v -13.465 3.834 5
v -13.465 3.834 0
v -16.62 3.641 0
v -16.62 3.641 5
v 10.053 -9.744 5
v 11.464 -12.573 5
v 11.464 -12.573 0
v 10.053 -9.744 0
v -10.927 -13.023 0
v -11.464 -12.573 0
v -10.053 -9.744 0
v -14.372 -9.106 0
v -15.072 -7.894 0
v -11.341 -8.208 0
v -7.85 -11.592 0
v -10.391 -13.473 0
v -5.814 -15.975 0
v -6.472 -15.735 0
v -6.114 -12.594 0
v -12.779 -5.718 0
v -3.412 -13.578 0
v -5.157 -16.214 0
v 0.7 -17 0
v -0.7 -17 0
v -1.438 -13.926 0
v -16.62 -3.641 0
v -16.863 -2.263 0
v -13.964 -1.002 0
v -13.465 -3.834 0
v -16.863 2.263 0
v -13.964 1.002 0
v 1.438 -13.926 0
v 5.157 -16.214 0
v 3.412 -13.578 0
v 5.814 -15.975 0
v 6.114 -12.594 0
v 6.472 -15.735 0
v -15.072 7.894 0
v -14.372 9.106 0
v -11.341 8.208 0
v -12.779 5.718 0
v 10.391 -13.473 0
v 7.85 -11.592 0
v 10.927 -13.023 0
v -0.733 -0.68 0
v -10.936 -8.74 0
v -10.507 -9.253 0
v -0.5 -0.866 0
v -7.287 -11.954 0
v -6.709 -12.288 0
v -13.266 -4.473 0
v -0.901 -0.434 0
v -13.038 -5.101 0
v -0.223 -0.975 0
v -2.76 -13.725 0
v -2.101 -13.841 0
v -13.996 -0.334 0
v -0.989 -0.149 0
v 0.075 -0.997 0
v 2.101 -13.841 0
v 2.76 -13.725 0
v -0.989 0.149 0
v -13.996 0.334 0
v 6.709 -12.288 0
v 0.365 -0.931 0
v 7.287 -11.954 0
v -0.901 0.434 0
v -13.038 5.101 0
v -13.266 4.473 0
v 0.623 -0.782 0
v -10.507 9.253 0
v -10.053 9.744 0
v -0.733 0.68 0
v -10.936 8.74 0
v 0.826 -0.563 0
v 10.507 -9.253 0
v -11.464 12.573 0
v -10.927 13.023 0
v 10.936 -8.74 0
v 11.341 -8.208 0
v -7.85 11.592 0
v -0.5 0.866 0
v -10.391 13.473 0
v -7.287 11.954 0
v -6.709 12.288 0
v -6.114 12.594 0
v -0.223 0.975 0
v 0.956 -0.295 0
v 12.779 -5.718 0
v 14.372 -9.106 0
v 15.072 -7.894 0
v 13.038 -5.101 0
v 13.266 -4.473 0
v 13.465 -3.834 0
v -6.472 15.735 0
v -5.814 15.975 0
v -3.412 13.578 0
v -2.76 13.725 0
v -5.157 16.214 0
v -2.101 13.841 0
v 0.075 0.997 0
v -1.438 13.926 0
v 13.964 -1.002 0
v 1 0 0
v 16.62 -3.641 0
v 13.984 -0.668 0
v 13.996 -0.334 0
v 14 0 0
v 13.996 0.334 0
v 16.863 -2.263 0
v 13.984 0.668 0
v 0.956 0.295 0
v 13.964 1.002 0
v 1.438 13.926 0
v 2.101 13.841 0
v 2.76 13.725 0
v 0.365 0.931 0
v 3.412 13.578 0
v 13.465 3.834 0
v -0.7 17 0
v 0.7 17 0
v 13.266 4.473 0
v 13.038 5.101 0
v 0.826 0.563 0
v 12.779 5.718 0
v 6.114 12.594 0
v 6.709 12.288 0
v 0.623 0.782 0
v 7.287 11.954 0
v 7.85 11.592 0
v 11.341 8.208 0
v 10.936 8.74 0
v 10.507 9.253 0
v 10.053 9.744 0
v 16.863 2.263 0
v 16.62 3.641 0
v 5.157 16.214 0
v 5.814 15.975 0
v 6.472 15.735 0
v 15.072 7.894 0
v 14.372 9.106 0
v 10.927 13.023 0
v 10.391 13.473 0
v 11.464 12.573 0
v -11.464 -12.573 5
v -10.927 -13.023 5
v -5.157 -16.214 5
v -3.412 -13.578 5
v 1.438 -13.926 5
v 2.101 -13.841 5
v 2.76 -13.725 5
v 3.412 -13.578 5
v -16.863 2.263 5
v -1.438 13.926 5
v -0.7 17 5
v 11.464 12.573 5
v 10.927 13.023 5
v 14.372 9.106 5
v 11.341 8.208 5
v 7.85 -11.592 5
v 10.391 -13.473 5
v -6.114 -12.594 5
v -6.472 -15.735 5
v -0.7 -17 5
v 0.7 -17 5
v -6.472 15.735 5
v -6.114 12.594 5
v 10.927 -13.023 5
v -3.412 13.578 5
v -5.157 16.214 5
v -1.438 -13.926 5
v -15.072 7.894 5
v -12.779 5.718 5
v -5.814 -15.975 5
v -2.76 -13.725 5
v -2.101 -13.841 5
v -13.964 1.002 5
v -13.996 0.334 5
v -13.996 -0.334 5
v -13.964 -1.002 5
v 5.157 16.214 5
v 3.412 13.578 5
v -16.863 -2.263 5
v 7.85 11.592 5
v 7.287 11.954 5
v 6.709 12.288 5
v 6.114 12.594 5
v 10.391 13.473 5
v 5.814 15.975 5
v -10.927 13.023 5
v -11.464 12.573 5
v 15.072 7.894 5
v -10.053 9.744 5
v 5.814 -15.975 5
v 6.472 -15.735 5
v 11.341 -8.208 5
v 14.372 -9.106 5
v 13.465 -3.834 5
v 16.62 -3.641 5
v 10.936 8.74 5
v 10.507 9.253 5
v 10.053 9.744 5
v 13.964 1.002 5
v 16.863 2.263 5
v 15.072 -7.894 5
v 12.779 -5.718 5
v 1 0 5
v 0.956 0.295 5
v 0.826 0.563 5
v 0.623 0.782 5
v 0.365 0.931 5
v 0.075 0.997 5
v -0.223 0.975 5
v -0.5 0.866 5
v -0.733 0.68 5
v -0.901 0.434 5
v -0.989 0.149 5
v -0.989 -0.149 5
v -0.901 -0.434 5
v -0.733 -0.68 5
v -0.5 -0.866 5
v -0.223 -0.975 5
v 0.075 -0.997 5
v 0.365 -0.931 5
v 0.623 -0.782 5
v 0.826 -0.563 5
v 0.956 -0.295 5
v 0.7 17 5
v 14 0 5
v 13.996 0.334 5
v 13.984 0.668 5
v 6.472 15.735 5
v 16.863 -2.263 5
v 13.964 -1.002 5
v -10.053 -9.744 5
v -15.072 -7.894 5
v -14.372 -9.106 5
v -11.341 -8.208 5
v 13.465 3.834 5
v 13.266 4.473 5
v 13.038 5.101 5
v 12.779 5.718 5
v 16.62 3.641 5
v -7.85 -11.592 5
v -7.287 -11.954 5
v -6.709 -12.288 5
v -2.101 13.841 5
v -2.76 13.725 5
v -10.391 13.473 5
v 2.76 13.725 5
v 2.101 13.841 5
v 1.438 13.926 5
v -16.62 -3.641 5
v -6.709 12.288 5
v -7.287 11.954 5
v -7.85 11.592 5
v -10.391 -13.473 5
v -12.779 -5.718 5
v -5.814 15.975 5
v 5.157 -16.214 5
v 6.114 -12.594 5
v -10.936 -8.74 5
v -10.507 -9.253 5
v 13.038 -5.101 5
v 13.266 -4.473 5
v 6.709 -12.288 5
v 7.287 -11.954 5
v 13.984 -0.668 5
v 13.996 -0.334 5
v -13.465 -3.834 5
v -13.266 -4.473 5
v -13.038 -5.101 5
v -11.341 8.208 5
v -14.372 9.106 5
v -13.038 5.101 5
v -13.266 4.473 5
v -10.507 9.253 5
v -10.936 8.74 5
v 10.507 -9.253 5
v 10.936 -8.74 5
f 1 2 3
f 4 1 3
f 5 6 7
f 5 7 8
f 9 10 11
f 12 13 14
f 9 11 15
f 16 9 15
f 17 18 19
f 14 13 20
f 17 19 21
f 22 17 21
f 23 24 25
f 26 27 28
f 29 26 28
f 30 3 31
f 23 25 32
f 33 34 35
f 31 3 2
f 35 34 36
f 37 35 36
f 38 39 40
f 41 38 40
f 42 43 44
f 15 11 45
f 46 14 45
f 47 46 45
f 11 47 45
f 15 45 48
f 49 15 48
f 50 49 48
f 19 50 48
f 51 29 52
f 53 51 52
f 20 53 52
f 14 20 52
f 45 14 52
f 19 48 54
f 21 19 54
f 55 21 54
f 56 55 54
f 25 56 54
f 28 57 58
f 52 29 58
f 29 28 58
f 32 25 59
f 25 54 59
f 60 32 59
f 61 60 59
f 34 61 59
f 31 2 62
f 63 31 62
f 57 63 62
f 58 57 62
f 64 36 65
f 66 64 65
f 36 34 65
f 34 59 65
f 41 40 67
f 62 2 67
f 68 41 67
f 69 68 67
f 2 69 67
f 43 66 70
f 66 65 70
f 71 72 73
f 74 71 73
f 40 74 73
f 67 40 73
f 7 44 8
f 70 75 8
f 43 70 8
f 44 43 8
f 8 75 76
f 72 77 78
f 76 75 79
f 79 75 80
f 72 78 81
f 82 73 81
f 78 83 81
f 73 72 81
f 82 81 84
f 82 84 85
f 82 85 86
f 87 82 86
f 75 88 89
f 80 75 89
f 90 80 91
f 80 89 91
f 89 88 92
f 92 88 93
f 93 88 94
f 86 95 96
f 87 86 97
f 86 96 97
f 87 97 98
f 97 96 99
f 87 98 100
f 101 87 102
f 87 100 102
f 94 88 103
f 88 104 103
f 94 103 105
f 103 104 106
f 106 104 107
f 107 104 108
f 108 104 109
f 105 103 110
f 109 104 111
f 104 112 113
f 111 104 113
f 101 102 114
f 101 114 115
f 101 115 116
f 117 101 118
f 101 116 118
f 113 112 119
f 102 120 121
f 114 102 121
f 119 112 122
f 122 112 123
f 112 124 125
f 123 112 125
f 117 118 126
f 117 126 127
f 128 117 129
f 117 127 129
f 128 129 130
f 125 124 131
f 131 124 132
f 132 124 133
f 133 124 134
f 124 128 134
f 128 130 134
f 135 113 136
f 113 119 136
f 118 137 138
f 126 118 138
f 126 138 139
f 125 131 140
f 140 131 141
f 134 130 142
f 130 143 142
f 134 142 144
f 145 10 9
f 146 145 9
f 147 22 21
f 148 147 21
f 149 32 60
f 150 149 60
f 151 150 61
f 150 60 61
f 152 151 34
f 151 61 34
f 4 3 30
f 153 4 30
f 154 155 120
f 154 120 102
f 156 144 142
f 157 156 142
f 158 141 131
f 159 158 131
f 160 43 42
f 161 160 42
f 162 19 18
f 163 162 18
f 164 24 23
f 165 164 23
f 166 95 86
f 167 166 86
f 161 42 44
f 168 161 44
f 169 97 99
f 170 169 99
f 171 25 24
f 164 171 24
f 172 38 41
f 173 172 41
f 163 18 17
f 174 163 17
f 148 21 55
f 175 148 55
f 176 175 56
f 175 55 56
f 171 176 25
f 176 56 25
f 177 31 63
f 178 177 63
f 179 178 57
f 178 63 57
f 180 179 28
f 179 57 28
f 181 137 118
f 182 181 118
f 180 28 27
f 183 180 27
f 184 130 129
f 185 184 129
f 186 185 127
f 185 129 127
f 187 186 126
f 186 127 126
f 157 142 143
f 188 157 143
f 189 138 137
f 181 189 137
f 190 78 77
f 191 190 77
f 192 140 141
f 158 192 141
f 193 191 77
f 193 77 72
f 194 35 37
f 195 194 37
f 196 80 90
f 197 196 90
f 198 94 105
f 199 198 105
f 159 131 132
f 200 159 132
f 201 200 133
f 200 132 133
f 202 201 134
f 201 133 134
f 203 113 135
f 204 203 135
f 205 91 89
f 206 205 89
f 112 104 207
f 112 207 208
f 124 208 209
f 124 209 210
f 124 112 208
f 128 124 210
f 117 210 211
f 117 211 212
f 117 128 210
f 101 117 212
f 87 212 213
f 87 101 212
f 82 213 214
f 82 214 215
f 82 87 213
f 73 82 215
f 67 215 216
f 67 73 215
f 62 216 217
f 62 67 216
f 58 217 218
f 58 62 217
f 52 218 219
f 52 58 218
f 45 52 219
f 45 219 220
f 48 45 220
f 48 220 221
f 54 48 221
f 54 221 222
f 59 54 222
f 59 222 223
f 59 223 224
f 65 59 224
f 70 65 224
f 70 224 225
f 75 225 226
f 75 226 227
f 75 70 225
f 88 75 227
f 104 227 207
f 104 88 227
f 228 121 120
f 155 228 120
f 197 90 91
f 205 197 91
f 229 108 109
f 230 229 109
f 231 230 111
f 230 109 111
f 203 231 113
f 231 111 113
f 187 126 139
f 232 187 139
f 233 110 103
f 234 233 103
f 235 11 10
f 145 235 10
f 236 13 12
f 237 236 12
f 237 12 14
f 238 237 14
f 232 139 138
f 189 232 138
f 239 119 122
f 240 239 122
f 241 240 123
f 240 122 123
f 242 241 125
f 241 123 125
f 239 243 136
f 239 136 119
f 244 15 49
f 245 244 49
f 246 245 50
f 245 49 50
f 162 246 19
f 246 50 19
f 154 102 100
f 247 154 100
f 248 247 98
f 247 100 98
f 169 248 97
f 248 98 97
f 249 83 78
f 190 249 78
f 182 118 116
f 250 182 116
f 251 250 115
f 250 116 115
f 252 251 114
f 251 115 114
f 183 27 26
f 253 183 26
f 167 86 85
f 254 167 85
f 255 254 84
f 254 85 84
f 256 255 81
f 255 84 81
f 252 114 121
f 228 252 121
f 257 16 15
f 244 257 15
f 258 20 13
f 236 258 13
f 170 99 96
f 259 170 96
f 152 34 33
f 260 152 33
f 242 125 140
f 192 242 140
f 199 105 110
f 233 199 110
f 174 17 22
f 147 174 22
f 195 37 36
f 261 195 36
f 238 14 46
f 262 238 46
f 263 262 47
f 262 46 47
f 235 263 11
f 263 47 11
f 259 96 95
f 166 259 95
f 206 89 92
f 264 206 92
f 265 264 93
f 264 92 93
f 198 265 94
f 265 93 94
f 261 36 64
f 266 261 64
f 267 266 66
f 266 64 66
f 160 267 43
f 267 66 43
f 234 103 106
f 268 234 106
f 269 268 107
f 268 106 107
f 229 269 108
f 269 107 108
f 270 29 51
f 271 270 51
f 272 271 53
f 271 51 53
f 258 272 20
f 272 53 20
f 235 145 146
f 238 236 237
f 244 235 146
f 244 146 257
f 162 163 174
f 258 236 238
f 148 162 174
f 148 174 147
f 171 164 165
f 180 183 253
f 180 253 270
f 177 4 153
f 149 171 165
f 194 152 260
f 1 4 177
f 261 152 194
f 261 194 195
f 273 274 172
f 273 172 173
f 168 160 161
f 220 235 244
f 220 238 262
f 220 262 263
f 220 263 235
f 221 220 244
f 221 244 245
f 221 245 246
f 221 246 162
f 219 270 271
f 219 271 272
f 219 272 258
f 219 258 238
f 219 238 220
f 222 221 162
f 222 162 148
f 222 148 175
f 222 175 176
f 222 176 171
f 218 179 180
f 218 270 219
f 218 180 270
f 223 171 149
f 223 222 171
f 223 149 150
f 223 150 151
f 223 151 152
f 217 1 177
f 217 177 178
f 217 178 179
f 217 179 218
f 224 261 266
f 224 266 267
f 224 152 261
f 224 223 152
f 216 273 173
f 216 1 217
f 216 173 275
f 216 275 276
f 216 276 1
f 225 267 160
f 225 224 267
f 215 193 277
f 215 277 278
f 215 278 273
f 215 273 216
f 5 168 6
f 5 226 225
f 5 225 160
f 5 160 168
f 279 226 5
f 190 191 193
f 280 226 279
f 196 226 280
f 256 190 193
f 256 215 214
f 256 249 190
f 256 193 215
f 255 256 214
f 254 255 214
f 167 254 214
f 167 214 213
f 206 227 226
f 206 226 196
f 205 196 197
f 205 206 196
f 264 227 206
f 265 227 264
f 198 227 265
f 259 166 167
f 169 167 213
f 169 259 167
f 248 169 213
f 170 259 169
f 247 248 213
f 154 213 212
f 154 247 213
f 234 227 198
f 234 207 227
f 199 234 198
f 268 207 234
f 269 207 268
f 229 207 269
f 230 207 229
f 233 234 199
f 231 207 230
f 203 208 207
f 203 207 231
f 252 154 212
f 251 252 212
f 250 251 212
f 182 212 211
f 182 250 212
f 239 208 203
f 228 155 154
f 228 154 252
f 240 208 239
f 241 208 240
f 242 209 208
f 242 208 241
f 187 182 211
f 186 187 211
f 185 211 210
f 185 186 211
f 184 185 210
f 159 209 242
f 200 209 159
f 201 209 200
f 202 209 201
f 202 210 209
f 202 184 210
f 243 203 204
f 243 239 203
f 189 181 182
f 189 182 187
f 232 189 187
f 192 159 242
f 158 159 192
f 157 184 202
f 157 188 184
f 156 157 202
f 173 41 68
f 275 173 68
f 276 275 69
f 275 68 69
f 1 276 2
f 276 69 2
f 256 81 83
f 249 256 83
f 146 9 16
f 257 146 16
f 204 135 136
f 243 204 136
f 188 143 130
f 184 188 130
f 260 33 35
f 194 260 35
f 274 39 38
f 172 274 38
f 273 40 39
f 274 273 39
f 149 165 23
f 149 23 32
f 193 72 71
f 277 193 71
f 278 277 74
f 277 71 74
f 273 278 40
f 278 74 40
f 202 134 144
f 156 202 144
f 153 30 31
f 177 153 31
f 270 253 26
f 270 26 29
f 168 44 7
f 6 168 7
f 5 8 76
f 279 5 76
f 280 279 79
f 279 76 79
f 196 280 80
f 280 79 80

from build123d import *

# Parameters (mm, degrees)
F0_R     = 1
F1_DEPTH = 5


with BuildPart() as f1:
    # F0 (on Top) → F1 (new body)
    with BuildSketch(Plane.XY):
        with BuildLine():
            ThreePointArc((13.964093, -1.002049), (13.99102, -0.501346), (14, 0))
            ThreePointArc((14, 0), (13.99102, 0.501346), (13.964093, 1.002049))
            ThreePointArc((13.964093, 1.002049), (13.787309, 2.431074), (13.464676, 3.834383))
            ThreePointArc((13.464676, 3.834383), (13.155697, 4.788282), (12.779234, 5.717619))
            ThreePointArc((12.779234, 5.717619), (12.124356, 7), (11.341221, 8.208332))
            ThreePointArc((11.341221, 8.208332), (10.724622, 8.999027), (10.053011, 9.74356))
            ThreePointArc((10.053011, 9.74356), (8.999027, 10.724622), (7.849846, 11.592235))
            ThreePointArc((7.849846, 11.592235), (7, 12.124356), (6.114247, 12.594284))
            ThreePointArc((6.114247, 12.594284), (4.788282, 13.155697), (3.411665, 13.577943))
            ThreePointArc((3.411665, 13.577943), (2.431074, 13.787309), (1.438014, 13.925951))
            ThreePointArc((1.438014, 13.925951), (0, 14), (-1.438014, 13.925951))
            ThreePointArc((-1.438014, 13.925951), (-2.431074, 13.787309), (-3.411665, 13.577943))
            ThreePointArc((-3.411665, 13.577943), (-4.788282, 13.155697), (-6.114247, 12.594284))
            ThreePointArc((-6.114247, 12.594284), (-7, 12.124356), (-7.849846, 11.592235))
            ThreePointArc((-7.849846, 11.592235), (-8.999027, 10.724622), (-10.053011, 9.74356))
            ThreePointArc((-10.053011, 9.74356), (-10.724622, 8.999027), (-11.341221, 8.208332))
            ThreePointArc((-11.341221, 8.208332), (-12.124356, 7), (-12.779234, 5.717619))
            ThreePointArc((-12.779234, 5.717619), (-13.155697, 4.788282), (-13.464676, 3.834383))
            ThreePointArc((-13.464676, 3.834383), (-13.787309, 2.431074), (-13.964093, 1.002049))
            ThreePointArc((-13.964093, 1.002049), (-14, 0), (-13.964093, -1.002049))
            ThreePointArc((-13.964093, -1.002049), (-13.787309, -2.431074), (-13.464676, -3.834383))
            ThreePointArc((-13.464676, -3.834383), (-13.155697, -4.788282), (-12.779234, -5.717619))
            ThreePointArc((-12.779234, -5.717619), (-12.124356, -7), (-11.341221, -8.208332))
            ThreePointArc((-11.341221, -8.208332), (-10.724622, -8.999027), (-10.053011, -9.74356))
            ThreePointArc((-10.053011, -9.74356), (-8.999027, -10.724622), (-7.849846, -11.592235))
            ThreePointArc((-7.849846, -11.592235), (-7, -12.124356), (-6.114247, -12.594284))
            ThreePointArc((-6.114247, -12.594284), (-4.788282, -13.155697), (-3.411665, -13.577943))
            ThreePointArc((-3.411665, -13.577943), (-2.431074, -13.787309), (-1.438014, -13.925951))
            ThreePointArc((-1.438014, -13.925951), (0, -14), (1.438014, -13.925951))
            ThreePointArc((1.438014, -13.925951), (2.431074, -13.787309), (3.411665, -13.577943))
            ThreePointArc((3.411665, -13.577943), (4.788282, -13.155697), (6.114247, -12.594284))
            ThreePointArc((6.114247, -12.594284), (7, -12.124356), (7.849846, -11.592235))
            ThreePointArc((7.849846, -11.592235), (8.999027, -10.724622), (10.053011, -9.74356))
            ThreePointArc((10.053011, -9.74356), (10.724622, -8.999027), (11.341221, -8.208332))
            ThreePointArc((11.341221, -8.208332), (12.124356, -7), (12.779234, -5.717619))
            ThreePointArc((12.779234, -5.717619), (13.155697, -4.788282), (13.464676, -3.834383))
            ThreePointArc((13.464676, -3.834383), (13.787309, -2.431074), (13.964093, -1.002049))
        make_face()
        Circle(F0_R, mode=Mode.SUBTRACT)
        with BuildLine():
            Line((15.072432, -7.893782), (12.779234, -5.717619))
            ThreePointArc((12.779234, -5.717619), (12.124356, -7), (11.341221, -8.208332))
            Line((11.341221, -8.208332), (14.372432, -9.106218))
            Line((14.372432, -9.106218), (14.722432, -8.5))
            Line((14.722432, -8.5), (15.072432, -7.893782))
        make_face()
        with BuildLine():
            Line((0.7, -17), (1.438014, -13.925951))
            ThreePointArc((1.438014, -13.925951), (0, -14), (-1.438014, -13.925951))
            Line((-1.438014, -13.925951), (-0.7, -17))
            Line((-0.7, -17), (0, -17))
            Line((0, -17), (0.7, -17))
        make_face()
        with BuildLine():
            Line((-10.391158, -13.472707), (-7.849846, -11.592235))
            ThreePointArc((-7.849846, -11.592235), (-8.999027, -10.724622), (-10.053011, -9.74356))
            Line((-10.053011, -9.74356), (-11.46362, -12.572804))
            Line((-11.46362, -12.572804), (-10.927389, -13.022756))
            Line((-10.927389, -13.022756), (-10.391158, -13.472707))
        make_face()
        with BuildLine():
            Line((11.46362, -12.572804), (10.053011, -9.74356))
            ThreePointArc((10.053011, -9.74356), (8.999027, -10.724622), (7.849846, -11.592235))
            Line((7.849846, -11.592235), (10.391158, -13.472707))
            Line((10.391158, -13.472707), (10.927389, -13.022756))
            Line((10.927389, -13.022756), (11.46362, -12.572804))
        make_face()
        with BuildLine():
            Line((-5.156558, -16.214189), (-3.411665, -13.577943))
            ThreePointArc((-3.411665, -13.577943), (-4.788282, -13.155697), (-6.114247, -12.594284))
            Line((-6.114247, -12.594284), (-6.472127, -15.73536))
            Line((-6.472127, -15.73536), (-5.814342, -15.974775))
            Line((-5.814342, -15.974775), (-5.156558, -16.214189))
        make_face()
        with BuildLine():
            ThreePointArc((13.464676, 3.834383), (13.787309, 2.431074), (13.964093, 1.002049))
            Line((13.964093, 1.002049), (16.863286, 2.262654))
            Line((16.863286, 2.262654), (16.741732, 2.952019))
            Line((16.741732, 2.952019), (16.620178, 3.641384))
            Line((16.620178, 3.641384), (13.464676, 3.834383))
        make_face()
        with BuildLine():
            Line((16.863286, -2.262654), (13.964093, -1.002049))
            ThreePointArc((13.964093, -1.002049), (13.787309, -2.431074), (13.464676, -3.834383))
            Line((13.464676, -3.834383), (16.620178, -3.641384))
            Line((16.620178, -3.641384), (16.741732, -2.952019))
            Line((16.741732, -2.952019), (16.863286, -2.262654))
        make_face()
        with BuildLine():
            Line((6.472127, -15.73536), (6.114247, -12.594284))
            ThreePointArc((6.114247, -12.594284), (4.788282, -13.155697), (3.411665, -13.577943))
            Line((3.411665, -13.577943), (5.156558, -16.214189))
            Line((5.156558, -16.214189), (5.814342, -15.974775))
            Line((5.814342, -15.974775), (6.472127, -15.73536))
        make_face()
        with BuildLine():
            ThreePointArc((-1.438014, 13.925951), (0, 14), (1.438014, 13.925951))
            Line((1.438014, 13.925951), (0.7, 17))
            Line((0.7, 17), (0, 17))
            Line((0, 17), (-0.7, 17))
            Line((-0.7, 17), (-1.438014, 13.925951))
        make_face()
        with BuildLine():
            ThreePointArc((3.411665, 13.577943), (4.788282, 13.155697), (6.114247, 12.594284))
            Line((6.114247, 12.594284), (6.472127, 15.73536))
            Line((6.472127, 15.73536), (5.814342, 15.974775))
            Line((5.814342, 15.974775), (5.156558, 16.214189))
            Line((5.156558, 16.214189), (3.411665, 13.577943))
        make_face()
        with BuildLine():
            ThreePointArc((11.341221, 8.208332), (12.124356, 7), (12.779234, 5.717619))
            Line((12.779234, 5.717619), (15.072432, 7.893782))
            Line((15.072432, 7.893782), (14.722432, 8.5))
            Line((14.722432, 8.5), (14.372432, 9.106218))
            Line((14.372432, 9.106218), (11.341221, 8.208332))
        make_face()
        with BuildLine():
            ThreePointArc((-6.114247, 12.594284), (-4.788282, 13.155697), (-3.411665, 13.577943))
            Line((-3.411665, 13.577943), (-5.156558, 16.214189))
            Line((-5.156558, 16.214189), (-5.814342, 15.974775))
            Line((-5.814342, 15.974775), (-6.472127, 15.73536))
            Line((-6.472127, 15.73536), (-6.114247, 12.594284))
        make_face()
        with BuildLine():
            ThreePointArc((-12.779234, 5.717619), (-12.124356, 7), (-11.341221, 8.208332))
            Line((-11.341221, 8.208332), (-14.372432, 9.106218))
            Line((-14.372432, 9.106218), (-14.722432, 8.5))
            Line((-14.722432, 8.5), (-15.072432, 7.893782))
            Line((-15.072432, 7.893782), (-12.779234, 5.717619))
        make_face()
        with BuildLine():
            ThreePointArc((7.849846, 11.592235), (8.999027, 10.724622), (10.053011, 9.74356))
            Line((10.053011, 9.74356), (11.46362, 12.572804))
            Line((11.46362, 12.572804), (10.927389, 13.022756))
            Line((10.927389, 13.022756), (10.391158, 13.472707))
            Line((10.391158, 13.472707), (7.849846, 11.592235))
        make_face()
        with BuildLine():
            ThreePointArc((-10.053011, 9.74356), (-8.999027, 10.724622), (-7.849846, 11.592235))
            Line((-7.849846, 11.592235), (-10.391158, 13.472707))
            Line((-10.391158, 13.472707), (-10.927389, 13.022756))
            Line((-10.927389, 13.022756), (-11.46362, 12.572804))
            Line((-11.46362, 12.572804), (-10.053011, 9.74356))
        make_face()
        with BuildLine():
            ThreePointArc((-13.964093, 1.002049), (-13.787309, 2.431074), (-13.464676, 3.834383))
            Line((-13.464676, 3.834383), (-16.620178, 3.641384))
            Line((-16.620178, 3.641384), (-16.741732, 2.952019))
            Line((-16.741732, 2.952019), (-16.863286, 2.262654))
            Line((-16.863286, 2.262654), (-13.964093, 1.002049))
        make_face()
        with BuildLine():
            Line((-16.620178, -3.641384), (-13.464676, -3.834383))
            ThreePointArc((-13.464676, -3.834383), (-13.787309, -2.431074), (-13.964093, -1.002049))
            Line((-13.964093, -1.002049), (-16.863286, -2.262654))
            Line((-16.863286, -2.262654), (-16.741732, -2.952019))
            Line((-16.741732, -2.952019), (-16.620178, -3.641384))
        make_face()
        with BuildLine():
            Line((-14.372432, -9.106218), (-11.341221, -8.208332))
            ThreePointArc((-11.341221, -8.208332), (-12.124356, -7), (-12.779234, -5.717619))
            Line((-12.779234, -5.717619), (-15.072432, -7.893782))
            Line((-15.072432, -7.893782), (-14.722432, -8.5))
            Line((-14.722432, -8.5), (-14.372432, -9.106218))
        make_face()
    extrude(amount=F1_DEPTH)


solid = f1.part
